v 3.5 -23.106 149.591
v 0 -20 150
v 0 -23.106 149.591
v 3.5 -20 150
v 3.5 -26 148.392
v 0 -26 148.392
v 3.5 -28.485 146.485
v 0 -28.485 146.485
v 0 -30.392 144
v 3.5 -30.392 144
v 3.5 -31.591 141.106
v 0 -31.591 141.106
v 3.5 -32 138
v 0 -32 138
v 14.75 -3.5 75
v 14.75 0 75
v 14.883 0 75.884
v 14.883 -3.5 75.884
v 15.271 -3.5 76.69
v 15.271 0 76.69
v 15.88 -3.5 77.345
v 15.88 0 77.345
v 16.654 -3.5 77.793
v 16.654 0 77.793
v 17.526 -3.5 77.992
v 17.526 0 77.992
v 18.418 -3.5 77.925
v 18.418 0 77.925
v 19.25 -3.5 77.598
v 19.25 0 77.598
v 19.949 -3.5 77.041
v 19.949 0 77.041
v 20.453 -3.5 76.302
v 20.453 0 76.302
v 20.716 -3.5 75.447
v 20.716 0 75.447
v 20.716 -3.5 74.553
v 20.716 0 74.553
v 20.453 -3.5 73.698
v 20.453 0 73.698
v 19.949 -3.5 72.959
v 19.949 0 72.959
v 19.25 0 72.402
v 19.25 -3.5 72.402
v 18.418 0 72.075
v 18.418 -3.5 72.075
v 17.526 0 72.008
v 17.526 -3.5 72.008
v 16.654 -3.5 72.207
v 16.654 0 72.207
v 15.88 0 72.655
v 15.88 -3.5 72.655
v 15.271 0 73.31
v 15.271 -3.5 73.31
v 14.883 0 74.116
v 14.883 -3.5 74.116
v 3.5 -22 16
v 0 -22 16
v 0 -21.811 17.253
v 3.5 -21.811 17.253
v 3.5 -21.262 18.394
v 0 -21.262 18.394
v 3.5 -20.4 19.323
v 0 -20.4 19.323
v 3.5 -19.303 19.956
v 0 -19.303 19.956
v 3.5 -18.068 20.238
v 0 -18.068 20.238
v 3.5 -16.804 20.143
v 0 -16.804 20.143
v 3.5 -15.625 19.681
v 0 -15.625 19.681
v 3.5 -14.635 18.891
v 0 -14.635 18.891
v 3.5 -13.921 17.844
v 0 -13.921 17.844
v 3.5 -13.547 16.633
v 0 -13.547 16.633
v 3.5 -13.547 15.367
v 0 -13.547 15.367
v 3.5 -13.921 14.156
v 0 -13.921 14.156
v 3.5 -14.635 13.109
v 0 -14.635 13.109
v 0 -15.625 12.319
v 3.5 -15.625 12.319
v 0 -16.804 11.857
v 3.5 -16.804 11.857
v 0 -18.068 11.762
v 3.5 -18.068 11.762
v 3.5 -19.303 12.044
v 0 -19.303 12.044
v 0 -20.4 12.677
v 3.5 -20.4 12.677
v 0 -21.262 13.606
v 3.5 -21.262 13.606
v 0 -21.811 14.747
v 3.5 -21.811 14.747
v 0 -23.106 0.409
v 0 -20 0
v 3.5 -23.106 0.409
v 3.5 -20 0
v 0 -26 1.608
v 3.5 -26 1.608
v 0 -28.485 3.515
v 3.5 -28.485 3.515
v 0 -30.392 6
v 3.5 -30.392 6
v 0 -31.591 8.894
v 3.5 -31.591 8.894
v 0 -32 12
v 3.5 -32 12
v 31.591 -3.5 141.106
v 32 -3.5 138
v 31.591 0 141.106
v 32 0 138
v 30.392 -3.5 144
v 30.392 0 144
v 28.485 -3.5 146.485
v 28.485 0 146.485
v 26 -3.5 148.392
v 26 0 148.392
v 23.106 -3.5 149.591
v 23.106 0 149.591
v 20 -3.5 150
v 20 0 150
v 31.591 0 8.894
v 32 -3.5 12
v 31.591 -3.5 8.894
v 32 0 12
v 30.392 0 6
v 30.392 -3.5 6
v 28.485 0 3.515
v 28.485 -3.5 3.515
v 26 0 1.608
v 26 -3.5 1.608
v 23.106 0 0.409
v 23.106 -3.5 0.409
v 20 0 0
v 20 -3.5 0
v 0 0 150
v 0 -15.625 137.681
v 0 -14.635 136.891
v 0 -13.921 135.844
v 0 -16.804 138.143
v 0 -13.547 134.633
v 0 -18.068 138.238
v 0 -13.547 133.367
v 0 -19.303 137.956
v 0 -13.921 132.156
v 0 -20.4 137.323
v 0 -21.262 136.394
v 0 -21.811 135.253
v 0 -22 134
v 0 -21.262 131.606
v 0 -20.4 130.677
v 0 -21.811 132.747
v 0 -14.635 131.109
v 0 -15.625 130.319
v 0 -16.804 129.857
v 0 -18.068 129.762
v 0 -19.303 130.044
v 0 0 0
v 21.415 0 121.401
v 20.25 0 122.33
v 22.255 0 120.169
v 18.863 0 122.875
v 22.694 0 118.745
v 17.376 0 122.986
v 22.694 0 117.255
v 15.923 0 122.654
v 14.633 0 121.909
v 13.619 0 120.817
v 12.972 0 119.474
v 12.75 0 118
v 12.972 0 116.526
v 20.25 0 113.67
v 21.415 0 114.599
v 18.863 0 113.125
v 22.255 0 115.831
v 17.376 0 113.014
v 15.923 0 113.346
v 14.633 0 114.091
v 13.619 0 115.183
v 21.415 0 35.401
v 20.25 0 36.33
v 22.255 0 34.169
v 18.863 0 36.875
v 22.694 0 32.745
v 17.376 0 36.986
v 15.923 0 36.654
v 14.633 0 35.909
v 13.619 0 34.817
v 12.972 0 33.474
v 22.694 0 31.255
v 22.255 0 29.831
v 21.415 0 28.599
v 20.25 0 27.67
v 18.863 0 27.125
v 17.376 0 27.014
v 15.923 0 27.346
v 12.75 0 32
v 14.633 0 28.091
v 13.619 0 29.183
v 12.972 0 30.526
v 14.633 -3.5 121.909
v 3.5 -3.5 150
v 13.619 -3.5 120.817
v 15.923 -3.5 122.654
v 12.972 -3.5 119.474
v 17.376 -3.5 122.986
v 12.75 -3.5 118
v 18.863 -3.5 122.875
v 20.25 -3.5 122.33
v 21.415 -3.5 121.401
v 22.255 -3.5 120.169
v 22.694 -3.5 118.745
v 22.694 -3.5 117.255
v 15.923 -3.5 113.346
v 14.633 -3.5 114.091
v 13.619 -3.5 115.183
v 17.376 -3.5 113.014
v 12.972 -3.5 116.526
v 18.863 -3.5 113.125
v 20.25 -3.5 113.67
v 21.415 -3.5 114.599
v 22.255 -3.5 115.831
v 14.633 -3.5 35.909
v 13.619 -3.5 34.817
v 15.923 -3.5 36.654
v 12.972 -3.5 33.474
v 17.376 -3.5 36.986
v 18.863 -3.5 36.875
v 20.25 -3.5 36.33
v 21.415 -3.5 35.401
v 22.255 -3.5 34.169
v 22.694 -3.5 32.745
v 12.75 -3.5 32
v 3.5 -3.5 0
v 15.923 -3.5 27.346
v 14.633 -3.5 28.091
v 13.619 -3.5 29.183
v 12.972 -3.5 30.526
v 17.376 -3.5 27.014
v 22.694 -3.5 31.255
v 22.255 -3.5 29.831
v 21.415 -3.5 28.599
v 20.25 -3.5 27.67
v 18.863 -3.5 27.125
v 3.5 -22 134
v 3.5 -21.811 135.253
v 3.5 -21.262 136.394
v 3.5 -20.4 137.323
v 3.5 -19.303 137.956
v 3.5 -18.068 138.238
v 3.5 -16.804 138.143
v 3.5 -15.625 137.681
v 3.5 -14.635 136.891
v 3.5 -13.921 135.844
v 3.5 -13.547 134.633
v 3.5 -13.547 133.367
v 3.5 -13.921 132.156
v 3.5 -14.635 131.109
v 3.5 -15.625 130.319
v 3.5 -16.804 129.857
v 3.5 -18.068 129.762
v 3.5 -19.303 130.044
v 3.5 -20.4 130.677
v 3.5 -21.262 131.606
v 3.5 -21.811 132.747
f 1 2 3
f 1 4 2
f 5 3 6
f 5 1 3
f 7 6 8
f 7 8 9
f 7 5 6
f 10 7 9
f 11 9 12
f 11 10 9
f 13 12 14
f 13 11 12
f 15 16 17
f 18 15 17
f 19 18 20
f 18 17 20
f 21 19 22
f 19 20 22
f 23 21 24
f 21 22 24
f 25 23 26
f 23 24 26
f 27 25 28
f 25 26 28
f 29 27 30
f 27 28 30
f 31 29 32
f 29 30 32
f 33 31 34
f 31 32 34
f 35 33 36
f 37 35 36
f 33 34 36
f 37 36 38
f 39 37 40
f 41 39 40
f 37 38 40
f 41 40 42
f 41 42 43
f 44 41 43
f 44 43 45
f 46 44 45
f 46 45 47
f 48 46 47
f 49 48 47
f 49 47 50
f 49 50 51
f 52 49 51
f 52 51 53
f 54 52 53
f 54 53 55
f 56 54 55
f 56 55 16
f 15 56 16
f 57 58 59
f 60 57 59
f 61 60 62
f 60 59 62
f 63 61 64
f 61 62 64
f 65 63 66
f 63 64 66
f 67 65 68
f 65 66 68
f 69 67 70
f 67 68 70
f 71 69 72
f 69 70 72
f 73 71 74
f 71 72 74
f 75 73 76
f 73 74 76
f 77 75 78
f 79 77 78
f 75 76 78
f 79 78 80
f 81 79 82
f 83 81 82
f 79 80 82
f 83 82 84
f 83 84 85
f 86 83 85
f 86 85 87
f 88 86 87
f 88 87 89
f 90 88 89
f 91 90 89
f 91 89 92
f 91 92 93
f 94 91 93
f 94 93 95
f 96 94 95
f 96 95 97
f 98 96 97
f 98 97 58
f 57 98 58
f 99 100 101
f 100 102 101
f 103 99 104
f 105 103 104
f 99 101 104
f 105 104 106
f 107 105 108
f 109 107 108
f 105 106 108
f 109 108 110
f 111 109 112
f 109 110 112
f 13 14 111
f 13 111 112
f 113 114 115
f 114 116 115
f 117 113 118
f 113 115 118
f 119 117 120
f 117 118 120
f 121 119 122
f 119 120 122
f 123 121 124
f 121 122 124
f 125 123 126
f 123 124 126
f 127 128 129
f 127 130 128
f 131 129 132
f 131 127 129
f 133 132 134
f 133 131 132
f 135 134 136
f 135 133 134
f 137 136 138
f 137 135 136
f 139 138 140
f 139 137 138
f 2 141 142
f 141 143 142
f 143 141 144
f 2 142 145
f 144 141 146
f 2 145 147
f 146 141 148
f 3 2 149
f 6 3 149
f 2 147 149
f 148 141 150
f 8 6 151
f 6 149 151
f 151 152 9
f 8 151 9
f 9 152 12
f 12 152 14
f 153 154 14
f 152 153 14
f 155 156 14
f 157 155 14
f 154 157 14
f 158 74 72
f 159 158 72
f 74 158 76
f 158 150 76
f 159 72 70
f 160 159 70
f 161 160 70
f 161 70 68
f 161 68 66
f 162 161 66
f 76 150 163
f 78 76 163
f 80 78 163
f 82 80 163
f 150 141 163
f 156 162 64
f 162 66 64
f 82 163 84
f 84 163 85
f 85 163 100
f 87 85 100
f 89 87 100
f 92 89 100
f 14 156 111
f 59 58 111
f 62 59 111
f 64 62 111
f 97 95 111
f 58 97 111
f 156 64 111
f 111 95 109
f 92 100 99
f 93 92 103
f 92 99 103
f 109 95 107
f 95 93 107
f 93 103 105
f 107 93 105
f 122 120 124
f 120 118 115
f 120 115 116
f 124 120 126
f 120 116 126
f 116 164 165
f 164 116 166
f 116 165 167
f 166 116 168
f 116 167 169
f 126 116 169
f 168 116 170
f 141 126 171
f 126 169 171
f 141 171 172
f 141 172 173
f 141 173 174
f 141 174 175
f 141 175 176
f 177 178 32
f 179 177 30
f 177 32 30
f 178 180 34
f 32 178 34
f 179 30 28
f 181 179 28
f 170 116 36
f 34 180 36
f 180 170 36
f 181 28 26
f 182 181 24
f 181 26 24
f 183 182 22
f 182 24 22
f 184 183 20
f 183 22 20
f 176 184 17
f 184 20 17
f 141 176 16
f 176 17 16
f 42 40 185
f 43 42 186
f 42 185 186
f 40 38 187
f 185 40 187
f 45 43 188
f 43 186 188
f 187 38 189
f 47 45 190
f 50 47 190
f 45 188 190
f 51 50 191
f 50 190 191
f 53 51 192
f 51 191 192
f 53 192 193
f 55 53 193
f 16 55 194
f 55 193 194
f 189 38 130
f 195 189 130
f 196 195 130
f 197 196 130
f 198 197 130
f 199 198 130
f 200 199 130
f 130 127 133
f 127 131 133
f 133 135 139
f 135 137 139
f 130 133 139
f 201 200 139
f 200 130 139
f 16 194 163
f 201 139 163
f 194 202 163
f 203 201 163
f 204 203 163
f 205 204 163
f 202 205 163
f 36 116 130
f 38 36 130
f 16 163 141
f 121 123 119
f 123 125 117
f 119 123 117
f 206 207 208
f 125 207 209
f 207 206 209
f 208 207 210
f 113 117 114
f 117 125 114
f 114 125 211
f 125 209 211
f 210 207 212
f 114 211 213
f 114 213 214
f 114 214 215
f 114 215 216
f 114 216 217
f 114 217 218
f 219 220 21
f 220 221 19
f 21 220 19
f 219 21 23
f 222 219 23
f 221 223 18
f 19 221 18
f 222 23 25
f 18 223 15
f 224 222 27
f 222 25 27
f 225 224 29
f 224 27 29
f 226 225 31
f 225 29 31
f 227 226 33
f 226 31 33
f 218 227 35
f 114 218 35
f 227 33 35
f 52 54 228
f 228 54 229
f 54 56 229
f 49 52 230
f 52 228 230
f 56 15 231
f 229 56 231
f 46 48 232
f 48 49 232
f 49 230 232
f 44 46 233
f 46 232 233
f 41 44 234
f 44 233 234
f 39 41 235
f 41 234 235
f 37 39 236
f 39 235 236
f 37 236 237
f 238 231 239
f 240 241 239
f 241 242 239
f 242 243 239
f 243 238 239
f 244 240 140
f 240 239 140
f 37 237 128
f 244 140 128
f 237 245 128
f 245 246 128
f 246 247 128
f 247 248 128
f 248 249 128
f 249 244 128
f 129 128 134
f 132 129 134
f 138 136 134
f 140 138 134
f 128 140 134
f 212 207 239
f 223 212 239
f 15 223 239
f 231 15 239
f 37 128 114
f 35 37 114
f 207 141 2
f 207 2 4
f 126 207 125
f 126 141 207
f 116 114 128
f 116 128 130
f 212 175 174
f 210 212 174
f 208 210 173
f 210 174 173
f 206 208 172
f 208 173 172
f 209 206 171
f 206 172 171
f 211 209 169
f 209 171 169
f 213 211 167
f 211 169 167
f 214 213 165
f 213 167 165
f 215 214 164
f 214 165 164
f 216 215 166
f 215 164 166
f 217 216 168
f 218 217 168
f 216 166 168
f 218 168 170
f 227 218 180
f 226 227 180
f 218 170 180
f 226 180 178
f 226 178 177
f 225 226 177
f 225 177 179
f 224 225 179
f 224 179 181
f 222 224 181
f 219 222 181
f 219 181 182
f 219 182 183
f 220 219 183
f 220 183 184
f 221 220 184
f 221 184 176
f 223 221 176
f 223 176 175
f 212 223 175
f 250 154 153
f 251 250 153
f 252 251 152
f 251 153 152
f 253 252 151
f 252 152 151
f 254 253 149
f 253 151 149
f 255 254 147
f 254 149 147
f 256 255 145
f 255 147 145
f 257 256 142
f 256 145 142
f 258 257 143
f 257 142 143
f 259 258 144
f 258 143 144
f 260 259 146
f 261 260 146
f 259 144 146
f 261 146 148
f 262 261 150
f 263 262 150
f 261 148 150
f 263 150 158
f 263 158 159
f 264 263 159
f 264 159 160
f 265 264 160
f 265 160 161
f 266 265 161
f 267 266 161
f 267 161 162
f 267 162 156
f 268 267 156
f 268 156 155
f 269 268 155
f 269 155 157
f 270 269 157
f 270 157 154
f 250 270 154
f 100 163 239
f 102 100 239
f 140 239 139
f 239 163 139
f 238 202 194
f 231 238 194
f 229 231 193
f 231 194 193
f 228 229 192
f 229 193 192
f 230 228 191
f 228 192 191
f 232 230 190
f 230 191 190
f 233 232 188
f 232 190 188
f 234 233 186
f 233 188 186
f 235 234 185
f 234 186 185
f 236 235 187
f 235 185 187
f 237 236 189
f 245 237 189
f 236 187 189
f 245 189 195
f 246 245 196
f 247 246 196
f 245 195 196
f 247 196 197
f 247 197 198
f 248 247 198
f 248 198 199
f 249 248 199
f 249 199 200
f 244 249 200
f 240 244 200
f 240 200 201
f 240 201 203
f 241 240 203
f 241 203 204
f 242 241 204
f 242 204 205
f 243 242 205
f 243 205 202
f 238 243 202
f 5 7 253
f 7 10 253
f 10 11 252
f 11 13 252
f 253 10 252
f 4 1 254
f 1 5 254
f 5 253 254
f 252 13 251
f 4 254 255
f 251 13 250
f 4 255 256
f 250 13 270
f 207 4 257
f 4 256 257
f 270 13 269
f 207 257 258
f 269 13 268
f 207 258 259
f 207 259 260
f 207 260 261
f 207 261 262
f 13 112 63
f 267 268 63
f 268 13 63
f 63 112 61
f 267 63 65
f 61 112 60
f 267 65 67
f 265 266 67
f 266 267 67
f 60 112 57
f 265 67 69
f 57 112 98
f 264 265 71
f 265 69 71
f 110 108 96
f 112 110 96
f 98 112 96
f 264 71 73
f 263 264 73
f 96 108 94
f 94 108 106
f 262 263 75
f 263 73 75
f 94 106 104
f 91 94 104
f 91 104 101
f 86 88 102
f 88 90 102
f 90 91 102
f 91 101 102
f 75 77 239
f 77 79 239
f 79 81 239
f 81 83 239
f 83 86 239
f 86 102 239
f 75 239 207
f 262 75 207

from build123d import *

# Parameters (mm, degrees)
F1_DEPTH = 150
F3_D     = 8.5
F3_DEPTH = 16.5
F3_TIP   = 2.5536576309
F5_D     = 10
F5_DEPTH = 25
F5_TIP   = 3.0043030951
F7_D     = 6
F7_DEPTH = 25
F7_TIP   = 1.8025818571
F8_R     = 12


with BuildPart() as f1:
    # F0 (on Top) → F1 (new body)
    with BuildSketch(Plane.XY):
        Polygon((32, -3.5), (32, 0), (0, 0), (0, -32), (3.5, -32), (3.5, -3.5), align=None)
    extrude(amount=F1_DEPTH)

    # F3
    with Locations(Plane.YZ.offset(3.5)):
        with Locations((-17.75, 134), (-17.75, 16)):
            Hole(F3_D / 2, depth=F3_DEPTH)
            with Locations((0, 0, -(F3_DEPTH + F3_TIP / 2))):  # 118° drill point
                Cone(0, F3_D / 2, F3_TIP, mode=Mode.SUBTRACT)

    # F5
    with Locations(Plane.XZ.offset(3.5)):
        with Locations((17.75, 118), (17.75, 32)):
            Hole(F5_D / 2, depth=F5_DEPTH)
            with Locations((0, 0, -(F5_DEPTH + F5_TIP / 2))):  # 118° drill point
                Cone(0, F5_D / 2, F5_TIP, mode=Mode.SUBTRACT)

    # F7
    with Locations(Plane.XZ.offset(3.5)):
        with Locations((17.75, 75)):
            Hole(F7_D / 2, depth=F7_DEPTH)
            with Locations((0, 0, -(F7_DEPTH + F7_TIP / 2))):  # 118° drill point
                Cone(0, F7_D / 2, F7_TIP, mode=Mode.SUBTRACT)

    # F8
    f8_edges = [f1.edges().sort_by_distance(p)[0] for p in [
        (1.75, -32, 150),
        (32, -1.75, 150),
        (32, -1.75, 0),
        (1.75, -32, 0),
    ]]
    fillet(f8_edges, radius=F8_R)


solid = f1.part
